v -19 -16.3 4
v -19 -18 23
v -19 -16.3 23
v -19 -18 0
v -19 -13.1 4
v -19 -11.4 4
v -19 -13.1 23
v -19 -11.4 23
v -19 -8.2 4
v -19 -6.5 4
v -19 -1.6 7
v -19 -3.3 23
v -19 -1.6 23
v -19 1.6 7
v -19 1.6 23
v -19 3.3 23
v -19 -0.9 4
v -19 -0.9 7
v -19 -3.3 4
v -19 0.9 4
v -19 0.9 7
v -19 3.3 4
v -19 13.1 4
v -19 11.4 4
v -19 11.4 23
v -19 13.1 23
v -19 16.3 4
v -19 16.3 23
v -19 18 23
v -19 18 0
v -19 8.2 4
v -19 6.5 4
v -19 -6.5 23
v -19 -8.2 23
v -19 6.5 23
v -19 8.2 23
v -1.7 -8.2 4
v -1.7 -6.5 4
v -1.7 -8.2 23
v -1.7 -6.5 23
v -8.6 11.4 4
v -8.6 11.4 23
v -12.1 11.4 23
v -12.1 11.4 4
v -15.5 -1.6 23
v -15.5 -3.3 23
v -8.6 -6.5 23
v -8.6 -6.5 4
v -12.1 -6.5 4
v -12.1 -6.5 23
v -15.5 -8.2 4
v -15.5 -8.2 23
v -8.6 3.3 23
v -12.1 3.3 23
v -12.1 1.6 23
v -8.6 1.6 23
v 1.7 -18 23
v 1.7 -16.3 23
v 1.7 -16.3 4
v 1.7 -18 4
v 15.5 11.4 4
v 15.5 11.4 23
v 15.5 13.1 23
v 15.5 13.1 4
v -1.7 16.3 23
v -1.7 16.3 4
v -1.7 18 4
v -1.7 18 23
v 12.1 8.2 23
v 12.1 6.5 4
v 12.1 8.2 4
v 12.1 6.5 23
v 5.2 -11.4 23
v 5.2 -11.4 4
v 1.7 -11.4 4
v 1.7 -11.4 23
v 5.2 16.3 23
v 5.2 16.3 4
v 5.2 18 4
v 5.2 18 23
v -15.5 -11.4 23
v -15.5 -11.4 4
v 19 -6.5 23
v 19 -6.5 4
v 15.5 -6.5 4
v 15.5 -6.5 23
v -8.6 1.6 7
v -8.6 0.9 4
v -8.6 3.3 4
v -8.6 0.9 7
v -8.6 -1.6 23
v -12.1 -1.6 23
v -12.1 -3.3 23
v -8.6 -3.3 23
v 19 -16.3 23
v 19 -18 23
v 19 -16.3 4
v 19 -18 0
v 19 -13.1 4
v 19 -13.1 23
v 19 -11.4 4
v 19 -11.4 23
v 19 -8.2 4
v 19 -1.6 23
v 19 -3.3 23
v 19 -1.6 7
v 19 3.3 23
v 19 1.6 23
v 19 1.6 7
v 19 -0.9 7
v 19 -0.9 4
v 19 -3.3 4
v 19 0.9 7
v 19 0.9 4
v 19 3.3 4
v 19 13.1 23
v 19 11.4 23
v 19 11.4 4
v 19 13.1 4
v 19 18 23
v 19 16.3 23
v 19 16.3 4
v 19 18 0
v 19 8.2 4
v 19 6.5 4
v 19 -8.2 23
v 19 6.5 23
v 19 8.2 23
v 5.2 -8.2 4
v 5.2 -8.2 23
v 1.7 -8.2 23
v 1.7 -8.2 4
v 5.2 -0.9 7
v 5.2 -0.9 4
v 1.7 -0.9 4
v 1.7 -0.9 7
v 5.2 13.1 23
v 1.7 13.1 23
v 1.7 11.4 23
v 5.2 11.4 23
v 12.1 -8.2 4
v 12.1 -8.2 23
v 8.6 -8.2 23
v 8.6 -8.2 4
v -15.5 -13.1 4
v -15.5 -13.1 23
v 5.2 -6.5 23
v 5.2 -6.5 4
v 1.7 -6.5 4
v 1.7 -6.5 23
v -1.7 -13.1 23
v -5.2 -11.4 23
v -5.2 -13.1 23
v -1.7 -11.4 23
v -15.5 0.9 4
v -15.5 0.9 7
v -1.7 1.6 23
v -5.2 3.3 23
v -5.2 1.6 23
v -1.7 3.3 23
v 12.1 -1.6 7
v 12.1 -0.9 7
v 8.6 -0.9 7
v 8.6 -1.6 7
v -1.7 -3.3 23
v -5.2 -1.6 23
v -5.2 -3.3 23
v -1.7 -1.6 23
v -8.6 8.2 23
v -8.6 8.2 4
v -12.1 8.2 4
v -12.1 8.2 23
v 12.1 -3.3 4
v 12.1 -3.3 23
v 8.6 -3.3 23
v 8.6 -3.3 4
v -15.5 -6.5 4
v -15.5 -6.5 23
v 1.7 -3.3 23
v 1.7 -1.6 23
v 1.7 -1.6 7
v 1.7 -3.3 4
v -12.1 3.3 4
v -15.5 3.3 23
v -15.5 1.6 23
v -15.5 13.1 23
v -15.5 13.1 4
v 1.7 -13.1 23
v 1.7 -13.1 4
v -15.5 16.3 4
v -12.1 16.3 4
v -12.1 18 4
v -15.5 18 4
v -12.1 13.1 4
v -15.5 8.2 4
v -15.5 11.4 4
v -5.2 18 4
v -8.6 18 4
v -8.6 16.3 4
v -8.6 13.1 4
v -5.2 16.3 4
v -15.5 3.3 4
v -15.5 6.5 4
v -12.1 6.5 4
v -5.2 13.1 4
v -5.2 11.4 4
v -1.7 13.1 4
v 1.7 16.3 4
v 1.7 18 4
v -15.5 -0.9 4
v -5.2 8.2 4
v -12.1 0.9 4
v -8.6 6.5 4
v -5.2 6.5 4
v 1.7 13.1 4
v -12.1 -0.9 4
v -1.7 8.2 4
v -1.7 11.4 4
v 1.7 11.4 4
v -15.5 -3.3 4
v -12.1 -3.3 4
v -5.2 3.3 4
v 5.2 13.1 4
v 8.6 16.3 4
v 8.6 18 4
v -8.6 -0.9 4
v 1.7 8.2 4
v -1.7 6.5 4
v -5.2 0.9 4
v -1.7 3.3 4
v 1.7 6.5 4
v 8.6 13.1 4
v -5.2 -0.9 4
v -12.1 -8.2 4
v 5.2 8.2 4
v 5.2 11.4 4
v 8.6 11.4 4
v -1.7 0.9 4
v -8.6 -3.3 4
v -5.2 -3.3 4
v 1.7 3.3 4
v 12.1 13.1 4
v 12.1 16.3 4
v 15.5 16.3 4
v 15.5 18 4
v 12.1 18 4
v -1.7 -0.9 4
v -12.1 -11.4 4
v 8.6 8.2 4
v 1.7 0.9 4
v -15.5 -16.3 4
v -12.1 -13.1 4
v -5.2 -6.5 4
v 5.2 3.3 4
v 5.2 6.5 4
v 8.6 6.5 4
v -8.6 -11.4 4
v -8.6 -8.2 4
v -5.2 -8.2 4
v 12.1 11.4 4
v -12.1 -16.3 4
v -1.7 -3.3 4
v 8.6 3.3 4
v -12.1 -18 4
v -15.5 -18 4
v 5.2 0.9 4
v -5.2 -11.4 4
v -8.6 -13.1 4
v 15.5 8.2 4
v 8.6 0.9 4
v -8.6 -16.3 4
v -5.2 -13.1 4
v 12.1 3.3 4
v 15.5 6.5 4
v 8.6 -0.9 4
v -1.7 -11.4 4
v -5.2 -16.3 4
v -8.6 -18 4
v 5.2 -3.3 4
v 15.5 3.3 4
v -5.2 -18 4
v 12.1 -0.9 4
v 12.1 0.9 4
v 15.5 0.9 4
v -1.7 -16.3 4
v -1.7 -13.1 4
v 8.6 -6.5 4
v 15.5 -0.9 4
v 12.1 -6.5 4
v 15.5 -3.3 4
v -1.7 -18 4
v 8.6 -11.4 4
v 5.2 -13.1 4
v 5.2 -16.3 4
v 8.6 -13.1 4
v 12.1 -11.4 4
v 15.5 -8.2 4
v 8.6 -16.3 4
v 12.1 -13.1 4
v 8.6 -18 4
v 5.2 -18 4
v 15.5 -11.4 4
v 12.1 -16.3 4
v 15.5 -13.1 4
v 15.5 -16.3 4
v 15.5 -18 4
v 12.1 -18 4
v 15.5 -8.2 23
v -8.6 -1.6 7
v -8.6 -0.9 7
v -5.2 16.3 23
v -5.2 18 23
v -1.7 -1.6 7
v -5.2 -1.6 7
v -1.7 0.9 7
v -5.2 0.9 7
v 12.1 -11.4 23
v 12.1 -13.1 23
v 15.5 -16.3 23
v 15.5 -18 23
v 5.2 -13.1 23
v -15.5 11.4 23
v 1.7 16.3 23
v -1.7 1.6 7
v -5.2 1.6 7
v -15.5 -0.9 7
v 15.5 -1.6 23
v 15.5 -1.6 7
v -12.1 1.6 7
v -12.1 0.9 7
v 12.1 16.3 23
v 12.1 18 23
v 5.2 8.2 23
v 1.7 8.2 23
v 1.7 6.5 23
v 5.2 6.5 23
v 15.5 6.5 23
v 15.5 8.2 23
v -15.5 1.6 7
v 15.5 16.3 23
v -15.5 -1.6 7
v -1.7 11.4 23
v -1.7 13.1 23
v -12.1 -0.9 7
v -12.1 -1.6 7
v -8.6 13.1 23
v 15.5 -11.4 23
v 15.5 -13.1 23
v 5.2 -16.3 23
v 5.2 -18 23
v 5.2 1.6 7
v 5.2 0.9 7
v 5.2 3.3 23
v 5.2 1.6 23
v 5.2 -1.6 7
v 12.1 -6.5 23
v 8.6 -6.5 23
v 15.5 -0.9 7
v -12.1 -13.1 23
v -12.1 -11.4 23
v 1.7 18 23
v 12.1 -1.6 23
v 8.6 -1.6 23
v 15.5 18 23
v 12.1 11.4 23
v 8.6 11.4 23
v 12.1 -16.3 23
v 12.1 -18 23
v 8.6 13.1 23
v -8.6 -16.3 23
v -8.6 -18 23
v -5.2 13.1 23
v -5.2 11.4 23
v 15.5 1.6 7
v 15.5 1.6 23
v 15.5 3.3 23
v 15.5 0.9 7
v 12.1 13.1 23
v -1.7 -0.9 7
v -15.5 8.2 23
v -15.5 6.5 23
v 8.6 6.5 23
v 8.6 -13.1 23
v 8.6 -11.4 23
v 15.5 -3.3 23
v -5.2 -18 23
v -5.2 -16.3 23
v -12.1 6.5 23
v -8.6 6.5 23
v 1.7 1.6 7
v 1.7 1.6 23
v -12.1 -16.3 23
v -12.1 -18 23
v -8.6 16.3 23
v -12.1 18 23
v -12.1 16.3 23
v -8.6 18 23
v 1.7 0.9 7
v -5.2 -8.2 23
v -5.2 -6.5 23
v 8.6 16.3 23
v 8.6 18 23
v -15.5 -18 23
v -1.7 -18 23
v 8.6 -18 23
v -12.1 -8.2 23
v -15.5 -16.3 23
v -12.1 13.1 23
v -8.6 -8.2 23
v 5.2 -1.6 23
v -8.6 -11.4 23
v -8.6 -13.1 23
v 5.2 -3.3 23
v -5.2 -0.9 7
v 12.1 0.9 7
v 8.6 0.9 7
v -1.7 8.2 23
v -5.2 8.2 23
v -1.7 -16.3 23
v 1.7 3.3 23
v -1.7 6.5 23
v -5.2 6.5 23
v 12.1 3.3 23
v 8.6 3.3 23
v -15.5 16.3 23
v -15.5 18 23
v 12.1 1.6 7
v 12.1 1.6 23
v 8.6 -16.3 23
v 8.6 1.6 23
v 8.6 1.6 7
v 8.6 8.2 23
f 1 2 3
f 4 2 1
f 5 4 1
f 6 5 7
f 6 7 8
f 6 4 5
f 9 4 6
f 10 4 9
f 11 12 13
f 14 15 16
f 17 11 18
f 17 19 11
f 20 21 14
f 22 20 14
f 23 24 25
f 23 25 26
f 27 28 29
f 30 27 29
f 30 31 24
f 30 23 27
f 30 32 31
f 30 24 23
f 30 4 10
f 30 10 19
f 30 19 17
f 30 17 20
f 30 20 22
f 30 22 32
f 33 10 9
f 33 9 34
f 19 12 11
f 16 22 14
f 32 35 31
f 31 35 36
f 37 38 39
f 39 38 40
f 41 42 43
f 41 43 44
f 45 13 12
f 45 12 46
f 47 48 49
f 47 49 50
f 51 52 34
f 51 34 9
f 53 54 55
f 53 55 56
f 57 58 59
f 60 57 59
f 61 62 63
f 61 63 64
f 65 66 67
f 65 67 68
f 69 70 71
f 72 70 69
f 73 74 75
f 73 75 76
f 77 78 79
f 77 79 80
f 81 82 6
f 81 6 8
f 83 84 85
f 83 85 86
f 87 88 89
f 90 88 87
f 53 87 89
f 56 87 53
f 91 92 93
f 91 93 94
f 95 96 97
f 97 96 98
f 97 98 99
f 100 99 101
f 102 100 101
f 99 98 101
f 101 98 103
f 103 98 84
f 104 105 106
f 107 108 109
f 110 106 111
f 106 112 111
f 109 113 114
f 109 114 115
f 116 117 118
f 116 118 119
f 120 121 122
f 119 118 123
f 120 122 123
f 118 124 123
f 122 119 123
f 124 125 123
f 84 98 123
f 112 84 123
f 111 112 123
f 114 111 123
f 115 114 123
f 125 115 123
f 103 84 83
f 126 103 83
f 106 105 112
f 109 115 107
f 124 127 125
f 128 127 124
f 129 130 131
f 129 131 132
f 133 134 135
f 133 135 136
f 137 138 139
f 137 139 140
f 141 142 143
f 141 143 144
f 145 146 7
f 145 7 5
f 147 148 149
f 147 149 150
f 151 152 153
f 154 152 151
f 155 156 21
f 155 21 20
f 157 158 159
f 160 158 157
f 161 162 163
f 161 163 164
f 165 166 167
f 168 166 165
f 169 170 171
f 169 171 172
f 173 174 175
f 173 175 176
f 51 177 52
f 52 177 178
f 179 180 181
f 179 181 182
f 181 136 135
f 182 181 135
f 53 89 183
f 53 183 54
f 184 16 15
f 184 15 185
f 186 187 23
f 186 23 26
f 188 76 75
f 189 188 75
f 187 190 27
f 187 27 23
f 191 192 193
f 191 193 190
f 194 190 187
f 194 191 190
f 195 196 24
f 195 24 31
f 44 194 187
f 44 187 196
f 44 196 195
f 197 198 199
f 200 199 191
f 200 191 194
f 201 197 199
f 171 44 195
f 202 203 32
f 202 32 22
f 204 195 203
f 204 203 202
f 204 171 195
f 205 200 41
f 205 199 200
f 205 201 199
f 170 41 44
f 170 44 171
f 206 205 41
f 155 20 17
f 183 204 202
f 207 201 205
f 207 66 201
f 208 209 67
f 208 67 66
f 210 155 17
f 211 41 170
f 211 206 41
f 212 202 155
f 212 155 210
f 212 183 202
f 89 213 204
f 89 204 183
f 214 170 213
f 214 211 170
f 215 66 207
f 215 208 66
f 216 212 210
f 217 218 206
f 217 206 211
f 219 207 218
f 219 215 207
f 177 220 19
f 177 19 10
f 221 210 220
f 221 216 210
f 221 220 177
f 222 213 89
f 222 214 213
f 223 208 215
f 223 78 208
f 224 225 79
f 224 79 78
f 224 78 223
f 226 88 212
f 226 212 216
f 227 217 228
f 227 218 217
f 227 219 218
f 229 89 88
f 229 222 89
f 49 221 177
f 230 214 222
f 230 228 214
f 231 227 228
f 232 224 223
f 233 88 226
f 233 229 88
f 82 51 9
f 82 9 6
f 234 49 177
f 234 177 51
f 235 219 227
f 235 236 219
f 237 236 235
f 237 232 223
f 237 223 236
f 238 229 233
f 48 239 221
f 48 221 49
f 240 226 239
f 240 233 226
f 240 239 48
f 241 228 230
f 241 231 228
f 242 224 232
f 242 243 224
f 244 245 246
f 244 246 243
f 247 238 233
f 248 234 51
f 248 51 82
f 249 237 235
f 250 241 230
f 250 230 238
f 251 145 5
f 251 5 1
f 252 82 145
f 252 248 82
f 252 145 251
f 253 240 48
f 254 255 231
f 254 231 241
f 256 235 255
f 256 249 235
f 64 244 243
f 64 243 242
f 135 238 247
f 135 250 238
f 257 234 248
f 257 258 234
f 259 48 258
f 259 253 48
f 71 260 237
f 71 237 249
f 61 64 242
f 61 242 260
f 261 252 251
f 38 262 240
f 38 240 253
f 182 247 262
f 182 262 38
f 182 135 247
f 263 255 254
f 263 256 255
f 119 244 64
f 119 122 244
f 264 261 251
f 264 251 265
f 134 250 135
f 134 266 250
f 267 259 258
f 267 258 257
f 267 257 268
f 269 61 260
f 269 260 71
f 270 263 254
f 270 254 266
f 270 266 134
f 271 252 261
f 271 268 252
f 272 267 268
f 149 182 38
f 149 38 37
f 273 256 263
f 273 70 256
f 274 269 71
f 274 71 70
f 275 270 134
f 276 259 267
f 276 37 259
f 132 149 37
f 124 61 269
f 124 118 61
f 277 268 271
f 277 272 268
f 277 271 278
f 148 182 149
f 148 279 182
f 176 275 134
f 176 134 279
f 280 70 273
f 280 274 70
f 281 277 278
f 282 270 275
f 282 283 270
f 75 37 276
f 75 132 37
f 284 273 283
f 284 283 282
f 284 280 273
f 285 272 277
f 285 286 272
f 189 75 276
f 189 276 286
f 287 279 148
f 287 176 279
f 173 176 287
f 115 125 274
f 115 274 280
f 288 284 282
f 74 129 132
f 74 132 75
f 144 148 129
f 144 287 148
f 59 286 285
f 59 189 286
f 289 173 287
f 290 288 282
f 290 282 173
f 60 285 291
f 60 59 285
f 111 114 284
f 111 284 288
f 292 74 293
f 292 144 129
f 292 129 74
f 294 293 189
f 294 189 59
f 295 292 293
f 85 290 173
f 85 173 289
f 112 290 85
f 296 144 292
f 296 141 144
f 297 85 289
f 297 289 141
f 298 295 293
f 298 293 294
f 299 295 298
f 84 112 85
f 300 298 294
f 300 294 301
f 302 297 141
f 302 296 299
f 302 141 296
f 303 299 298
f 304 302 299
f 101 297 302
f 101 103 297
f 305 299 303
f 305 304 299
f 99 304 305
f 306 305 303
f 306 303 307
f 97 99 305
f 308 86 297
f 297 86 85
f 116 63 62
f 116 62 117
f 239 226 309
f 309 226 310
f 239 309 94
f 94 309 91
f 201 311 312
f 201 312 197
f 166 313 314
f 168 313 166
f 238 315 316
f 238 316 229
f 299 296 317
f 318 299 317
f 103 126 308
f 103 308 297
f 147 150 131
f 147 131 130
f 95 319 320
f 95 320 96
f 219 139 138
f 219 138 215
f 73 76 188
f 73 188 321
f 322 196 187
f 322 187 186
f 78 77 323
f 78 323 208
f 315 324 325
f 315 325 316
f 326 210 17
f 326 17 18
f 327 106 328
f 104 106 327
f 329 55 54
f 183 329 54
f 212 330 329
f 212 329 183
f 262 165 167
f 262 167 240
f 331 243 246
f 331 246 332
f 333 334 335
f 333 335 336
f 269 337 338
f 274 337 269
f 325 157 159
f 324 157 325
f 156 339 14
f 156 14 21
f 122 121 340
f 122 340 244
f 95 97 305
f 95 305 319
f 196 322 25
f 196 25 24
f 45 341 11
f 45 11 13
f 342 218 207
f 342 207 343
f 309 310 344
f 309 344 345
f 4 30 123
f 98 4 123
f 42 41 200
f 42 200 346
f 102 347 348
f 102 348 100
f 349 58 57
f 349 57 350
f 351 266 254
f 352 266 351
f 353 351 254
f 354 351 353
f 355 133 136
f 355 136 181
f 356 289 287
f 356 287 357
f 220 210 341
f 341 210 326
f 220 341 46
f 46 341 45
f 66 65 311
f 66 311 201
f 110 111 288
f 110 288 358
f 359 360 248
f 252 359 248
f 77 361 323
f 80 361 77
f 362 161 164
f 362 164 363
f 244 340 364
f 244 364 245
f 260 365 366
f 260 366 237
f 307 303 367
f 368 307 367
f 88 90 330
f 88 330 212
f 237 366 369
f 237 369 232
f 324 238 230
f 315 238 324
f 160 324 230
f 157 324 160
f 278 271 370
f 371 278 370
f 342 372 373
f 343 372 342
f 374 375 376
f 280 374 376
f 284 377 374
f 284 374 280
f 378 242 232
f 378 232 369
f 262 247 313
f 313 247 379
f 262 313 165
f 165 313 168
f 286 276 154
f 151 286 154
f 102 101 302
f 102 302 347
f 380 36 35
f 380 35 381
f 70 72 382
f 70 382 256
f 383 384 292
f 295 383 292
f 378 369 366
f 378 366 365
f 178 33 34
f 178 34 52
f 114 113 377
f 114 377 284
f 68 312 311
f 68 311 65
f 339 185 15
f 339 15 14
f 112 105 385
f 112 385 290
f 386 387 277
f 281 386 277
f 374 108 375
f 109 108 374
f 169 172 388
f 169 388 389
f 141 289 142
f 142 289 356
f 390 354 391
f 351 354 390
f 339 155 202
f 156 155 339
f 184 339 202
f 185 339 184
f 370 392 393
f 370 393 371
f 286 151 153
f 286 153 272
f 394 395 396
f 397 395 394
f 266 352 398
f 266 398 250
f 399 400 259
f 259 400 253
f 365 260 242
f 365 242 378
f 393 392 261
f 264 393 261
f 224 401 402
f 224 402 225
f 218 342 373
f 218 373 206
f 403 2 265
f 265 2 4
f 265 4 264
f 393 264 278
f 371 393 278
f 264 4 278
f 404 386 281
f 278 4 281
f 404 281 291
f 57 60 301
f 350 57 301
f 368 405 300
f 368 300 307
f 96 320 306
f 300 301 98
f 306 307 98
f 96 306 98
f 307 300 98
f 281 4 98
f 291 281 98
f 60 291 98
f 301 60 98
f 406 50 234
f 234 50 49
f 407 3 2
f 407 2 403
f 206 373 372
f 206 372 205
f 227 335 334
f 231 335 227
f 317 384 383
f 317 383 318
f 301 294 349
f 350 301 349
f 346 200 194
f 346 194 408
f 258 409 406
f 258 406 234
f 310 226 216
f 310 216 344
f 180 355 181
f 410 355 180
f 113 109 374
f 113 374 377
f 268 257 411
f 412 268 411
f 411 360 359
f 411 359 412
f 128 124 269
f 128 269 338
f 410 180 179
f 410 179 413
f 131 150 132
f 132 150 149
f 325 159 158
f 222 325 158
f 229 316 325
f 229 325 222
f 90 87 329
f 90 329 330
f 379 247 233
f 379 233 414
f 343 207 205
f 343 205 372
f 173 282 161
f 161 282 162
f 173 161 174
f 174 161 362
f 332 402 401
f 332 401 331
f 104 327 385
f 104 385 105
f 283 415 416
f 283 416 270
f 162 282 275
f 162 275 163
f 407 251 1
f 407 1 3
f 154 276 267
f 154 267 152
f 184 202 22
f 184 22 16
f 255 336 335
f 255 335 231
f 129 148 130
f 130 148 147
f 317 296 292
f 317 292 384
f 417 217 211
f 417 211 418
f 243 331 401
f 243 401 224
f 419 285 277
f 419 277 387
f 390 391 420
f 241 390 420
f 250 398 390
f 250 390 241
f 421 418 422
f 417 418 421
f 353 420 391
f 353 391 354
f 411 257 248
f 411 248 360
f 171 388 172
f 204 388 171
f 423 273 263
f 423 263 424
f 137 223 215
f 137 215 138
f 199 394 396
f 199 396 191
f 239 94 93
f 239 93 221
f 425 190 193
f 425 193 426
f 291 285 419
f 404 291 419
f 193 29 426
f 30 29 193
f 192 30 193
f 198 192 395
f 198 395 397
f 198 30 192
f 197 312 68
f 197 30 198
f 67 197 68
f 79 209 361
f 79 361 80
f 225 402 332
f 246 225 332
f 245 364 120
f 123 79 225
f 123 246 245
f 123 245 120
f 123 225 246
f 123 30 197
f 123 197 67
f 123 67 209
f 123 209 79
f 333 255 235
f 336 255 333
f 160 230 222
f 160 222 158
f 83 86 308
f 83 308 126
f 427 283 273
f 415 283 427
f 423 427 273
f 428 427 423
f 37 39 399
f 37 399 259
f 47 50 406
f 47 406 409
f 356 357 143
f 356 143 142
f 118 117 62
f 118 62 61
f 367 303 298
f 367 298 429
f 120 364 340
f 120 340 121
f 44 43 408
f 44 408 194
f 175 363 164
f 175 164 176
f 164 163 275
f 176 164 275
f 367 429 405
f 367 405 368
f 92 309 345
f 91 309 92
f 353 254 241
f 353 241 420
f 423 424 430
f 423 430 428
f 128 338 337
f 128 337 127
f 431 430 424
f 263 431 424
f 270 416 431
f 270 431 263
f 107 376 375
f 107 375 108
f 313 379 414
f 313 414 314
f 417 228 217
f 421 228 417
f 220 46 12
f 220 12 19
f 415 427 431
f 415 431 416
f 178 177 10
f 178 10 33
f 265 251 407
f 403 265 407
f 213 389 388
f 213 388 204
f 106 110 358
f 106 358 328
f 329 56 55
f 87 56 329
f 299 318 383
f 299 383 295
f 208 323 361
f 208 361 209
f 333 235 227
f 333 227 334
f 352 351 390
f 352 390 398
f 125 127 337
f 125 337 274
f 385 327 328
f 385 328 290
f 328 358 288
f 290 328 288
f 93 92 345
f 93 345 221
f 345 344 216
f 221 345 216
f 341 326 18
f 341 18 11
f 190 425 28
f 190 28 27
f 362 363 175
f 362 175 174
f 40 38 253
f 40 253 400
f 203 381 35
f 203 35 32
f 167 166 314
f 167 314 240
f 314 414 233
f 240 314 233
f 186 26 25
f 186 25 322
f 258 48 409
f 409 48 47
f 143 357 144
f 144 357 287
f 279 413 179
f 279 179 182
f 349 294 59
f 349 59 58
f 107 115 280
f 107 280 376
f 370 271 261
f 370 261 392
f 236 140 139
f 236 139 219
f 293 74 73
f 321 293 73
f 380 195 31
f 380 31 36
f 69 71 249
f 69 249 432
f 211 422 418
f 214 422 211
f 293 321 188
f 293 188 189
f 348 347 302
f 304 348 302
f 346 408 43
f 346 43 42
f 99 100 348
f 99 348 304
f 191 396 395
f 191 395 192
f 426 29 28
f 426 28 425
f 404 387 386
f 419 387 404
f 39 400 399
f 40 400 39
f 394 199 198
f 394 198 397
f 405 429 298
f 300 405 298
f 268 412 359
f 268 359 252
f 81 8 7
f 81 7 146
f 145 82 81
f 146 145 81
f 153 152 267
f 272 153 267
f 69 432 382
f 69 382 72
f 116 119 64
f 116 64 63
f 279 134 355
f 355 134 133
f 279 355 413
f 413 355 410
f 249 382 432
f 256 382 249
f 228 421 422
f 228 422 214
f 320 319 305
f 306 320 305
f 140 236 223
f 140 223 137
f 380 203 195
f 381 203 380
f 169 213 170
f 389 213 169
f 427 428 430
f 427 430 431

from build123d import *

# Parameters (mm, degrees)
SKETCH_W             = 38
SKETCH_H             = 36
PAD_DEPTH            = 23
POCKET_DEPTH         = 38.001
POCKET001_DEPTH      = 18.001
POCKET001_DEPTH_BACK = -18.001


with BuildPart() as part:
    # Sketch → Pad (new body)
    with BuildSketch(Plane.XY):
        Rectangle(SKETCH_W, SKETCH_H)
    extrude(amount=PAD_DEPTH)

    # Sketch001 (on Face2 of Pad) → Pocket (cut, through all)
    with BuildSketch(Plane.YZ.offset(19)):
        Polygon((-18, 4), (-21, 4), (-21, 26), (21, 26), (21, 4), (18, 4), (18, 23), (16.3, 23), (16.3, 4), (13.1, 4), (13.1, 23), (11.4, 23), (11.4, 4), (8.2, 4), (8.2, 23), (6.5, 23), (6.5, 4), (3.3, 4), (3.3, 23), (1.6, 23), (1.6, 7), (0.9, 7), (0.9, 4), (-0.9, 4), (-0.9, 7), (-1.6, 7), (-1.6, 23), (-3.3, 23), (-3.3, 4), (-6.5, 4), (-6.5, 23), (-8.2, 23), (-8.2, 4), (-11.4, 4), (-11.4, 23), (-13.1, 23), (-13.1, 4), (-16.3, 4), (-16.3, 23), (-18, 23), align=None)
    extrude(amount=-POCKET_DEPTH, mode=Mode.SUBTRACT)

    # Sketch002 → Pocket001 (cut, two sides)
    with BuildSketch(Plane.XZ) as pocket001_sk:
        Polygon((-19, 23), (-19, 4), (-22.4, 4), (-22.4, 26.4), (22.4, 26.4), (22.4, 4), (19, 4), (19, 23), (15.5, 23), (15.5, 4), (12.1, 4), (12.1, 23), (8.6, 23), (8.6, 4), (5.2, 4), (5.2, 23), (1.7, 23), (1.7, 4), (-1.7, 4), (-1.7, 23), (-5.2, 23), (-5.2, 4), (-8.6, 4), (-8.6, 23), (-12.1, 23), (-12.1, 4), (-15.5, 4), (-15.5, 23), align=None)
    extrude(amount=-POCKET001_DEPTH, mode=Mode.SUBTRACT)
    extrude(pocket001_sk.sketch, amount=-POCKET001_DEPTH_BACK, mode=Mode.SUBTRACT)


solid = part.part
